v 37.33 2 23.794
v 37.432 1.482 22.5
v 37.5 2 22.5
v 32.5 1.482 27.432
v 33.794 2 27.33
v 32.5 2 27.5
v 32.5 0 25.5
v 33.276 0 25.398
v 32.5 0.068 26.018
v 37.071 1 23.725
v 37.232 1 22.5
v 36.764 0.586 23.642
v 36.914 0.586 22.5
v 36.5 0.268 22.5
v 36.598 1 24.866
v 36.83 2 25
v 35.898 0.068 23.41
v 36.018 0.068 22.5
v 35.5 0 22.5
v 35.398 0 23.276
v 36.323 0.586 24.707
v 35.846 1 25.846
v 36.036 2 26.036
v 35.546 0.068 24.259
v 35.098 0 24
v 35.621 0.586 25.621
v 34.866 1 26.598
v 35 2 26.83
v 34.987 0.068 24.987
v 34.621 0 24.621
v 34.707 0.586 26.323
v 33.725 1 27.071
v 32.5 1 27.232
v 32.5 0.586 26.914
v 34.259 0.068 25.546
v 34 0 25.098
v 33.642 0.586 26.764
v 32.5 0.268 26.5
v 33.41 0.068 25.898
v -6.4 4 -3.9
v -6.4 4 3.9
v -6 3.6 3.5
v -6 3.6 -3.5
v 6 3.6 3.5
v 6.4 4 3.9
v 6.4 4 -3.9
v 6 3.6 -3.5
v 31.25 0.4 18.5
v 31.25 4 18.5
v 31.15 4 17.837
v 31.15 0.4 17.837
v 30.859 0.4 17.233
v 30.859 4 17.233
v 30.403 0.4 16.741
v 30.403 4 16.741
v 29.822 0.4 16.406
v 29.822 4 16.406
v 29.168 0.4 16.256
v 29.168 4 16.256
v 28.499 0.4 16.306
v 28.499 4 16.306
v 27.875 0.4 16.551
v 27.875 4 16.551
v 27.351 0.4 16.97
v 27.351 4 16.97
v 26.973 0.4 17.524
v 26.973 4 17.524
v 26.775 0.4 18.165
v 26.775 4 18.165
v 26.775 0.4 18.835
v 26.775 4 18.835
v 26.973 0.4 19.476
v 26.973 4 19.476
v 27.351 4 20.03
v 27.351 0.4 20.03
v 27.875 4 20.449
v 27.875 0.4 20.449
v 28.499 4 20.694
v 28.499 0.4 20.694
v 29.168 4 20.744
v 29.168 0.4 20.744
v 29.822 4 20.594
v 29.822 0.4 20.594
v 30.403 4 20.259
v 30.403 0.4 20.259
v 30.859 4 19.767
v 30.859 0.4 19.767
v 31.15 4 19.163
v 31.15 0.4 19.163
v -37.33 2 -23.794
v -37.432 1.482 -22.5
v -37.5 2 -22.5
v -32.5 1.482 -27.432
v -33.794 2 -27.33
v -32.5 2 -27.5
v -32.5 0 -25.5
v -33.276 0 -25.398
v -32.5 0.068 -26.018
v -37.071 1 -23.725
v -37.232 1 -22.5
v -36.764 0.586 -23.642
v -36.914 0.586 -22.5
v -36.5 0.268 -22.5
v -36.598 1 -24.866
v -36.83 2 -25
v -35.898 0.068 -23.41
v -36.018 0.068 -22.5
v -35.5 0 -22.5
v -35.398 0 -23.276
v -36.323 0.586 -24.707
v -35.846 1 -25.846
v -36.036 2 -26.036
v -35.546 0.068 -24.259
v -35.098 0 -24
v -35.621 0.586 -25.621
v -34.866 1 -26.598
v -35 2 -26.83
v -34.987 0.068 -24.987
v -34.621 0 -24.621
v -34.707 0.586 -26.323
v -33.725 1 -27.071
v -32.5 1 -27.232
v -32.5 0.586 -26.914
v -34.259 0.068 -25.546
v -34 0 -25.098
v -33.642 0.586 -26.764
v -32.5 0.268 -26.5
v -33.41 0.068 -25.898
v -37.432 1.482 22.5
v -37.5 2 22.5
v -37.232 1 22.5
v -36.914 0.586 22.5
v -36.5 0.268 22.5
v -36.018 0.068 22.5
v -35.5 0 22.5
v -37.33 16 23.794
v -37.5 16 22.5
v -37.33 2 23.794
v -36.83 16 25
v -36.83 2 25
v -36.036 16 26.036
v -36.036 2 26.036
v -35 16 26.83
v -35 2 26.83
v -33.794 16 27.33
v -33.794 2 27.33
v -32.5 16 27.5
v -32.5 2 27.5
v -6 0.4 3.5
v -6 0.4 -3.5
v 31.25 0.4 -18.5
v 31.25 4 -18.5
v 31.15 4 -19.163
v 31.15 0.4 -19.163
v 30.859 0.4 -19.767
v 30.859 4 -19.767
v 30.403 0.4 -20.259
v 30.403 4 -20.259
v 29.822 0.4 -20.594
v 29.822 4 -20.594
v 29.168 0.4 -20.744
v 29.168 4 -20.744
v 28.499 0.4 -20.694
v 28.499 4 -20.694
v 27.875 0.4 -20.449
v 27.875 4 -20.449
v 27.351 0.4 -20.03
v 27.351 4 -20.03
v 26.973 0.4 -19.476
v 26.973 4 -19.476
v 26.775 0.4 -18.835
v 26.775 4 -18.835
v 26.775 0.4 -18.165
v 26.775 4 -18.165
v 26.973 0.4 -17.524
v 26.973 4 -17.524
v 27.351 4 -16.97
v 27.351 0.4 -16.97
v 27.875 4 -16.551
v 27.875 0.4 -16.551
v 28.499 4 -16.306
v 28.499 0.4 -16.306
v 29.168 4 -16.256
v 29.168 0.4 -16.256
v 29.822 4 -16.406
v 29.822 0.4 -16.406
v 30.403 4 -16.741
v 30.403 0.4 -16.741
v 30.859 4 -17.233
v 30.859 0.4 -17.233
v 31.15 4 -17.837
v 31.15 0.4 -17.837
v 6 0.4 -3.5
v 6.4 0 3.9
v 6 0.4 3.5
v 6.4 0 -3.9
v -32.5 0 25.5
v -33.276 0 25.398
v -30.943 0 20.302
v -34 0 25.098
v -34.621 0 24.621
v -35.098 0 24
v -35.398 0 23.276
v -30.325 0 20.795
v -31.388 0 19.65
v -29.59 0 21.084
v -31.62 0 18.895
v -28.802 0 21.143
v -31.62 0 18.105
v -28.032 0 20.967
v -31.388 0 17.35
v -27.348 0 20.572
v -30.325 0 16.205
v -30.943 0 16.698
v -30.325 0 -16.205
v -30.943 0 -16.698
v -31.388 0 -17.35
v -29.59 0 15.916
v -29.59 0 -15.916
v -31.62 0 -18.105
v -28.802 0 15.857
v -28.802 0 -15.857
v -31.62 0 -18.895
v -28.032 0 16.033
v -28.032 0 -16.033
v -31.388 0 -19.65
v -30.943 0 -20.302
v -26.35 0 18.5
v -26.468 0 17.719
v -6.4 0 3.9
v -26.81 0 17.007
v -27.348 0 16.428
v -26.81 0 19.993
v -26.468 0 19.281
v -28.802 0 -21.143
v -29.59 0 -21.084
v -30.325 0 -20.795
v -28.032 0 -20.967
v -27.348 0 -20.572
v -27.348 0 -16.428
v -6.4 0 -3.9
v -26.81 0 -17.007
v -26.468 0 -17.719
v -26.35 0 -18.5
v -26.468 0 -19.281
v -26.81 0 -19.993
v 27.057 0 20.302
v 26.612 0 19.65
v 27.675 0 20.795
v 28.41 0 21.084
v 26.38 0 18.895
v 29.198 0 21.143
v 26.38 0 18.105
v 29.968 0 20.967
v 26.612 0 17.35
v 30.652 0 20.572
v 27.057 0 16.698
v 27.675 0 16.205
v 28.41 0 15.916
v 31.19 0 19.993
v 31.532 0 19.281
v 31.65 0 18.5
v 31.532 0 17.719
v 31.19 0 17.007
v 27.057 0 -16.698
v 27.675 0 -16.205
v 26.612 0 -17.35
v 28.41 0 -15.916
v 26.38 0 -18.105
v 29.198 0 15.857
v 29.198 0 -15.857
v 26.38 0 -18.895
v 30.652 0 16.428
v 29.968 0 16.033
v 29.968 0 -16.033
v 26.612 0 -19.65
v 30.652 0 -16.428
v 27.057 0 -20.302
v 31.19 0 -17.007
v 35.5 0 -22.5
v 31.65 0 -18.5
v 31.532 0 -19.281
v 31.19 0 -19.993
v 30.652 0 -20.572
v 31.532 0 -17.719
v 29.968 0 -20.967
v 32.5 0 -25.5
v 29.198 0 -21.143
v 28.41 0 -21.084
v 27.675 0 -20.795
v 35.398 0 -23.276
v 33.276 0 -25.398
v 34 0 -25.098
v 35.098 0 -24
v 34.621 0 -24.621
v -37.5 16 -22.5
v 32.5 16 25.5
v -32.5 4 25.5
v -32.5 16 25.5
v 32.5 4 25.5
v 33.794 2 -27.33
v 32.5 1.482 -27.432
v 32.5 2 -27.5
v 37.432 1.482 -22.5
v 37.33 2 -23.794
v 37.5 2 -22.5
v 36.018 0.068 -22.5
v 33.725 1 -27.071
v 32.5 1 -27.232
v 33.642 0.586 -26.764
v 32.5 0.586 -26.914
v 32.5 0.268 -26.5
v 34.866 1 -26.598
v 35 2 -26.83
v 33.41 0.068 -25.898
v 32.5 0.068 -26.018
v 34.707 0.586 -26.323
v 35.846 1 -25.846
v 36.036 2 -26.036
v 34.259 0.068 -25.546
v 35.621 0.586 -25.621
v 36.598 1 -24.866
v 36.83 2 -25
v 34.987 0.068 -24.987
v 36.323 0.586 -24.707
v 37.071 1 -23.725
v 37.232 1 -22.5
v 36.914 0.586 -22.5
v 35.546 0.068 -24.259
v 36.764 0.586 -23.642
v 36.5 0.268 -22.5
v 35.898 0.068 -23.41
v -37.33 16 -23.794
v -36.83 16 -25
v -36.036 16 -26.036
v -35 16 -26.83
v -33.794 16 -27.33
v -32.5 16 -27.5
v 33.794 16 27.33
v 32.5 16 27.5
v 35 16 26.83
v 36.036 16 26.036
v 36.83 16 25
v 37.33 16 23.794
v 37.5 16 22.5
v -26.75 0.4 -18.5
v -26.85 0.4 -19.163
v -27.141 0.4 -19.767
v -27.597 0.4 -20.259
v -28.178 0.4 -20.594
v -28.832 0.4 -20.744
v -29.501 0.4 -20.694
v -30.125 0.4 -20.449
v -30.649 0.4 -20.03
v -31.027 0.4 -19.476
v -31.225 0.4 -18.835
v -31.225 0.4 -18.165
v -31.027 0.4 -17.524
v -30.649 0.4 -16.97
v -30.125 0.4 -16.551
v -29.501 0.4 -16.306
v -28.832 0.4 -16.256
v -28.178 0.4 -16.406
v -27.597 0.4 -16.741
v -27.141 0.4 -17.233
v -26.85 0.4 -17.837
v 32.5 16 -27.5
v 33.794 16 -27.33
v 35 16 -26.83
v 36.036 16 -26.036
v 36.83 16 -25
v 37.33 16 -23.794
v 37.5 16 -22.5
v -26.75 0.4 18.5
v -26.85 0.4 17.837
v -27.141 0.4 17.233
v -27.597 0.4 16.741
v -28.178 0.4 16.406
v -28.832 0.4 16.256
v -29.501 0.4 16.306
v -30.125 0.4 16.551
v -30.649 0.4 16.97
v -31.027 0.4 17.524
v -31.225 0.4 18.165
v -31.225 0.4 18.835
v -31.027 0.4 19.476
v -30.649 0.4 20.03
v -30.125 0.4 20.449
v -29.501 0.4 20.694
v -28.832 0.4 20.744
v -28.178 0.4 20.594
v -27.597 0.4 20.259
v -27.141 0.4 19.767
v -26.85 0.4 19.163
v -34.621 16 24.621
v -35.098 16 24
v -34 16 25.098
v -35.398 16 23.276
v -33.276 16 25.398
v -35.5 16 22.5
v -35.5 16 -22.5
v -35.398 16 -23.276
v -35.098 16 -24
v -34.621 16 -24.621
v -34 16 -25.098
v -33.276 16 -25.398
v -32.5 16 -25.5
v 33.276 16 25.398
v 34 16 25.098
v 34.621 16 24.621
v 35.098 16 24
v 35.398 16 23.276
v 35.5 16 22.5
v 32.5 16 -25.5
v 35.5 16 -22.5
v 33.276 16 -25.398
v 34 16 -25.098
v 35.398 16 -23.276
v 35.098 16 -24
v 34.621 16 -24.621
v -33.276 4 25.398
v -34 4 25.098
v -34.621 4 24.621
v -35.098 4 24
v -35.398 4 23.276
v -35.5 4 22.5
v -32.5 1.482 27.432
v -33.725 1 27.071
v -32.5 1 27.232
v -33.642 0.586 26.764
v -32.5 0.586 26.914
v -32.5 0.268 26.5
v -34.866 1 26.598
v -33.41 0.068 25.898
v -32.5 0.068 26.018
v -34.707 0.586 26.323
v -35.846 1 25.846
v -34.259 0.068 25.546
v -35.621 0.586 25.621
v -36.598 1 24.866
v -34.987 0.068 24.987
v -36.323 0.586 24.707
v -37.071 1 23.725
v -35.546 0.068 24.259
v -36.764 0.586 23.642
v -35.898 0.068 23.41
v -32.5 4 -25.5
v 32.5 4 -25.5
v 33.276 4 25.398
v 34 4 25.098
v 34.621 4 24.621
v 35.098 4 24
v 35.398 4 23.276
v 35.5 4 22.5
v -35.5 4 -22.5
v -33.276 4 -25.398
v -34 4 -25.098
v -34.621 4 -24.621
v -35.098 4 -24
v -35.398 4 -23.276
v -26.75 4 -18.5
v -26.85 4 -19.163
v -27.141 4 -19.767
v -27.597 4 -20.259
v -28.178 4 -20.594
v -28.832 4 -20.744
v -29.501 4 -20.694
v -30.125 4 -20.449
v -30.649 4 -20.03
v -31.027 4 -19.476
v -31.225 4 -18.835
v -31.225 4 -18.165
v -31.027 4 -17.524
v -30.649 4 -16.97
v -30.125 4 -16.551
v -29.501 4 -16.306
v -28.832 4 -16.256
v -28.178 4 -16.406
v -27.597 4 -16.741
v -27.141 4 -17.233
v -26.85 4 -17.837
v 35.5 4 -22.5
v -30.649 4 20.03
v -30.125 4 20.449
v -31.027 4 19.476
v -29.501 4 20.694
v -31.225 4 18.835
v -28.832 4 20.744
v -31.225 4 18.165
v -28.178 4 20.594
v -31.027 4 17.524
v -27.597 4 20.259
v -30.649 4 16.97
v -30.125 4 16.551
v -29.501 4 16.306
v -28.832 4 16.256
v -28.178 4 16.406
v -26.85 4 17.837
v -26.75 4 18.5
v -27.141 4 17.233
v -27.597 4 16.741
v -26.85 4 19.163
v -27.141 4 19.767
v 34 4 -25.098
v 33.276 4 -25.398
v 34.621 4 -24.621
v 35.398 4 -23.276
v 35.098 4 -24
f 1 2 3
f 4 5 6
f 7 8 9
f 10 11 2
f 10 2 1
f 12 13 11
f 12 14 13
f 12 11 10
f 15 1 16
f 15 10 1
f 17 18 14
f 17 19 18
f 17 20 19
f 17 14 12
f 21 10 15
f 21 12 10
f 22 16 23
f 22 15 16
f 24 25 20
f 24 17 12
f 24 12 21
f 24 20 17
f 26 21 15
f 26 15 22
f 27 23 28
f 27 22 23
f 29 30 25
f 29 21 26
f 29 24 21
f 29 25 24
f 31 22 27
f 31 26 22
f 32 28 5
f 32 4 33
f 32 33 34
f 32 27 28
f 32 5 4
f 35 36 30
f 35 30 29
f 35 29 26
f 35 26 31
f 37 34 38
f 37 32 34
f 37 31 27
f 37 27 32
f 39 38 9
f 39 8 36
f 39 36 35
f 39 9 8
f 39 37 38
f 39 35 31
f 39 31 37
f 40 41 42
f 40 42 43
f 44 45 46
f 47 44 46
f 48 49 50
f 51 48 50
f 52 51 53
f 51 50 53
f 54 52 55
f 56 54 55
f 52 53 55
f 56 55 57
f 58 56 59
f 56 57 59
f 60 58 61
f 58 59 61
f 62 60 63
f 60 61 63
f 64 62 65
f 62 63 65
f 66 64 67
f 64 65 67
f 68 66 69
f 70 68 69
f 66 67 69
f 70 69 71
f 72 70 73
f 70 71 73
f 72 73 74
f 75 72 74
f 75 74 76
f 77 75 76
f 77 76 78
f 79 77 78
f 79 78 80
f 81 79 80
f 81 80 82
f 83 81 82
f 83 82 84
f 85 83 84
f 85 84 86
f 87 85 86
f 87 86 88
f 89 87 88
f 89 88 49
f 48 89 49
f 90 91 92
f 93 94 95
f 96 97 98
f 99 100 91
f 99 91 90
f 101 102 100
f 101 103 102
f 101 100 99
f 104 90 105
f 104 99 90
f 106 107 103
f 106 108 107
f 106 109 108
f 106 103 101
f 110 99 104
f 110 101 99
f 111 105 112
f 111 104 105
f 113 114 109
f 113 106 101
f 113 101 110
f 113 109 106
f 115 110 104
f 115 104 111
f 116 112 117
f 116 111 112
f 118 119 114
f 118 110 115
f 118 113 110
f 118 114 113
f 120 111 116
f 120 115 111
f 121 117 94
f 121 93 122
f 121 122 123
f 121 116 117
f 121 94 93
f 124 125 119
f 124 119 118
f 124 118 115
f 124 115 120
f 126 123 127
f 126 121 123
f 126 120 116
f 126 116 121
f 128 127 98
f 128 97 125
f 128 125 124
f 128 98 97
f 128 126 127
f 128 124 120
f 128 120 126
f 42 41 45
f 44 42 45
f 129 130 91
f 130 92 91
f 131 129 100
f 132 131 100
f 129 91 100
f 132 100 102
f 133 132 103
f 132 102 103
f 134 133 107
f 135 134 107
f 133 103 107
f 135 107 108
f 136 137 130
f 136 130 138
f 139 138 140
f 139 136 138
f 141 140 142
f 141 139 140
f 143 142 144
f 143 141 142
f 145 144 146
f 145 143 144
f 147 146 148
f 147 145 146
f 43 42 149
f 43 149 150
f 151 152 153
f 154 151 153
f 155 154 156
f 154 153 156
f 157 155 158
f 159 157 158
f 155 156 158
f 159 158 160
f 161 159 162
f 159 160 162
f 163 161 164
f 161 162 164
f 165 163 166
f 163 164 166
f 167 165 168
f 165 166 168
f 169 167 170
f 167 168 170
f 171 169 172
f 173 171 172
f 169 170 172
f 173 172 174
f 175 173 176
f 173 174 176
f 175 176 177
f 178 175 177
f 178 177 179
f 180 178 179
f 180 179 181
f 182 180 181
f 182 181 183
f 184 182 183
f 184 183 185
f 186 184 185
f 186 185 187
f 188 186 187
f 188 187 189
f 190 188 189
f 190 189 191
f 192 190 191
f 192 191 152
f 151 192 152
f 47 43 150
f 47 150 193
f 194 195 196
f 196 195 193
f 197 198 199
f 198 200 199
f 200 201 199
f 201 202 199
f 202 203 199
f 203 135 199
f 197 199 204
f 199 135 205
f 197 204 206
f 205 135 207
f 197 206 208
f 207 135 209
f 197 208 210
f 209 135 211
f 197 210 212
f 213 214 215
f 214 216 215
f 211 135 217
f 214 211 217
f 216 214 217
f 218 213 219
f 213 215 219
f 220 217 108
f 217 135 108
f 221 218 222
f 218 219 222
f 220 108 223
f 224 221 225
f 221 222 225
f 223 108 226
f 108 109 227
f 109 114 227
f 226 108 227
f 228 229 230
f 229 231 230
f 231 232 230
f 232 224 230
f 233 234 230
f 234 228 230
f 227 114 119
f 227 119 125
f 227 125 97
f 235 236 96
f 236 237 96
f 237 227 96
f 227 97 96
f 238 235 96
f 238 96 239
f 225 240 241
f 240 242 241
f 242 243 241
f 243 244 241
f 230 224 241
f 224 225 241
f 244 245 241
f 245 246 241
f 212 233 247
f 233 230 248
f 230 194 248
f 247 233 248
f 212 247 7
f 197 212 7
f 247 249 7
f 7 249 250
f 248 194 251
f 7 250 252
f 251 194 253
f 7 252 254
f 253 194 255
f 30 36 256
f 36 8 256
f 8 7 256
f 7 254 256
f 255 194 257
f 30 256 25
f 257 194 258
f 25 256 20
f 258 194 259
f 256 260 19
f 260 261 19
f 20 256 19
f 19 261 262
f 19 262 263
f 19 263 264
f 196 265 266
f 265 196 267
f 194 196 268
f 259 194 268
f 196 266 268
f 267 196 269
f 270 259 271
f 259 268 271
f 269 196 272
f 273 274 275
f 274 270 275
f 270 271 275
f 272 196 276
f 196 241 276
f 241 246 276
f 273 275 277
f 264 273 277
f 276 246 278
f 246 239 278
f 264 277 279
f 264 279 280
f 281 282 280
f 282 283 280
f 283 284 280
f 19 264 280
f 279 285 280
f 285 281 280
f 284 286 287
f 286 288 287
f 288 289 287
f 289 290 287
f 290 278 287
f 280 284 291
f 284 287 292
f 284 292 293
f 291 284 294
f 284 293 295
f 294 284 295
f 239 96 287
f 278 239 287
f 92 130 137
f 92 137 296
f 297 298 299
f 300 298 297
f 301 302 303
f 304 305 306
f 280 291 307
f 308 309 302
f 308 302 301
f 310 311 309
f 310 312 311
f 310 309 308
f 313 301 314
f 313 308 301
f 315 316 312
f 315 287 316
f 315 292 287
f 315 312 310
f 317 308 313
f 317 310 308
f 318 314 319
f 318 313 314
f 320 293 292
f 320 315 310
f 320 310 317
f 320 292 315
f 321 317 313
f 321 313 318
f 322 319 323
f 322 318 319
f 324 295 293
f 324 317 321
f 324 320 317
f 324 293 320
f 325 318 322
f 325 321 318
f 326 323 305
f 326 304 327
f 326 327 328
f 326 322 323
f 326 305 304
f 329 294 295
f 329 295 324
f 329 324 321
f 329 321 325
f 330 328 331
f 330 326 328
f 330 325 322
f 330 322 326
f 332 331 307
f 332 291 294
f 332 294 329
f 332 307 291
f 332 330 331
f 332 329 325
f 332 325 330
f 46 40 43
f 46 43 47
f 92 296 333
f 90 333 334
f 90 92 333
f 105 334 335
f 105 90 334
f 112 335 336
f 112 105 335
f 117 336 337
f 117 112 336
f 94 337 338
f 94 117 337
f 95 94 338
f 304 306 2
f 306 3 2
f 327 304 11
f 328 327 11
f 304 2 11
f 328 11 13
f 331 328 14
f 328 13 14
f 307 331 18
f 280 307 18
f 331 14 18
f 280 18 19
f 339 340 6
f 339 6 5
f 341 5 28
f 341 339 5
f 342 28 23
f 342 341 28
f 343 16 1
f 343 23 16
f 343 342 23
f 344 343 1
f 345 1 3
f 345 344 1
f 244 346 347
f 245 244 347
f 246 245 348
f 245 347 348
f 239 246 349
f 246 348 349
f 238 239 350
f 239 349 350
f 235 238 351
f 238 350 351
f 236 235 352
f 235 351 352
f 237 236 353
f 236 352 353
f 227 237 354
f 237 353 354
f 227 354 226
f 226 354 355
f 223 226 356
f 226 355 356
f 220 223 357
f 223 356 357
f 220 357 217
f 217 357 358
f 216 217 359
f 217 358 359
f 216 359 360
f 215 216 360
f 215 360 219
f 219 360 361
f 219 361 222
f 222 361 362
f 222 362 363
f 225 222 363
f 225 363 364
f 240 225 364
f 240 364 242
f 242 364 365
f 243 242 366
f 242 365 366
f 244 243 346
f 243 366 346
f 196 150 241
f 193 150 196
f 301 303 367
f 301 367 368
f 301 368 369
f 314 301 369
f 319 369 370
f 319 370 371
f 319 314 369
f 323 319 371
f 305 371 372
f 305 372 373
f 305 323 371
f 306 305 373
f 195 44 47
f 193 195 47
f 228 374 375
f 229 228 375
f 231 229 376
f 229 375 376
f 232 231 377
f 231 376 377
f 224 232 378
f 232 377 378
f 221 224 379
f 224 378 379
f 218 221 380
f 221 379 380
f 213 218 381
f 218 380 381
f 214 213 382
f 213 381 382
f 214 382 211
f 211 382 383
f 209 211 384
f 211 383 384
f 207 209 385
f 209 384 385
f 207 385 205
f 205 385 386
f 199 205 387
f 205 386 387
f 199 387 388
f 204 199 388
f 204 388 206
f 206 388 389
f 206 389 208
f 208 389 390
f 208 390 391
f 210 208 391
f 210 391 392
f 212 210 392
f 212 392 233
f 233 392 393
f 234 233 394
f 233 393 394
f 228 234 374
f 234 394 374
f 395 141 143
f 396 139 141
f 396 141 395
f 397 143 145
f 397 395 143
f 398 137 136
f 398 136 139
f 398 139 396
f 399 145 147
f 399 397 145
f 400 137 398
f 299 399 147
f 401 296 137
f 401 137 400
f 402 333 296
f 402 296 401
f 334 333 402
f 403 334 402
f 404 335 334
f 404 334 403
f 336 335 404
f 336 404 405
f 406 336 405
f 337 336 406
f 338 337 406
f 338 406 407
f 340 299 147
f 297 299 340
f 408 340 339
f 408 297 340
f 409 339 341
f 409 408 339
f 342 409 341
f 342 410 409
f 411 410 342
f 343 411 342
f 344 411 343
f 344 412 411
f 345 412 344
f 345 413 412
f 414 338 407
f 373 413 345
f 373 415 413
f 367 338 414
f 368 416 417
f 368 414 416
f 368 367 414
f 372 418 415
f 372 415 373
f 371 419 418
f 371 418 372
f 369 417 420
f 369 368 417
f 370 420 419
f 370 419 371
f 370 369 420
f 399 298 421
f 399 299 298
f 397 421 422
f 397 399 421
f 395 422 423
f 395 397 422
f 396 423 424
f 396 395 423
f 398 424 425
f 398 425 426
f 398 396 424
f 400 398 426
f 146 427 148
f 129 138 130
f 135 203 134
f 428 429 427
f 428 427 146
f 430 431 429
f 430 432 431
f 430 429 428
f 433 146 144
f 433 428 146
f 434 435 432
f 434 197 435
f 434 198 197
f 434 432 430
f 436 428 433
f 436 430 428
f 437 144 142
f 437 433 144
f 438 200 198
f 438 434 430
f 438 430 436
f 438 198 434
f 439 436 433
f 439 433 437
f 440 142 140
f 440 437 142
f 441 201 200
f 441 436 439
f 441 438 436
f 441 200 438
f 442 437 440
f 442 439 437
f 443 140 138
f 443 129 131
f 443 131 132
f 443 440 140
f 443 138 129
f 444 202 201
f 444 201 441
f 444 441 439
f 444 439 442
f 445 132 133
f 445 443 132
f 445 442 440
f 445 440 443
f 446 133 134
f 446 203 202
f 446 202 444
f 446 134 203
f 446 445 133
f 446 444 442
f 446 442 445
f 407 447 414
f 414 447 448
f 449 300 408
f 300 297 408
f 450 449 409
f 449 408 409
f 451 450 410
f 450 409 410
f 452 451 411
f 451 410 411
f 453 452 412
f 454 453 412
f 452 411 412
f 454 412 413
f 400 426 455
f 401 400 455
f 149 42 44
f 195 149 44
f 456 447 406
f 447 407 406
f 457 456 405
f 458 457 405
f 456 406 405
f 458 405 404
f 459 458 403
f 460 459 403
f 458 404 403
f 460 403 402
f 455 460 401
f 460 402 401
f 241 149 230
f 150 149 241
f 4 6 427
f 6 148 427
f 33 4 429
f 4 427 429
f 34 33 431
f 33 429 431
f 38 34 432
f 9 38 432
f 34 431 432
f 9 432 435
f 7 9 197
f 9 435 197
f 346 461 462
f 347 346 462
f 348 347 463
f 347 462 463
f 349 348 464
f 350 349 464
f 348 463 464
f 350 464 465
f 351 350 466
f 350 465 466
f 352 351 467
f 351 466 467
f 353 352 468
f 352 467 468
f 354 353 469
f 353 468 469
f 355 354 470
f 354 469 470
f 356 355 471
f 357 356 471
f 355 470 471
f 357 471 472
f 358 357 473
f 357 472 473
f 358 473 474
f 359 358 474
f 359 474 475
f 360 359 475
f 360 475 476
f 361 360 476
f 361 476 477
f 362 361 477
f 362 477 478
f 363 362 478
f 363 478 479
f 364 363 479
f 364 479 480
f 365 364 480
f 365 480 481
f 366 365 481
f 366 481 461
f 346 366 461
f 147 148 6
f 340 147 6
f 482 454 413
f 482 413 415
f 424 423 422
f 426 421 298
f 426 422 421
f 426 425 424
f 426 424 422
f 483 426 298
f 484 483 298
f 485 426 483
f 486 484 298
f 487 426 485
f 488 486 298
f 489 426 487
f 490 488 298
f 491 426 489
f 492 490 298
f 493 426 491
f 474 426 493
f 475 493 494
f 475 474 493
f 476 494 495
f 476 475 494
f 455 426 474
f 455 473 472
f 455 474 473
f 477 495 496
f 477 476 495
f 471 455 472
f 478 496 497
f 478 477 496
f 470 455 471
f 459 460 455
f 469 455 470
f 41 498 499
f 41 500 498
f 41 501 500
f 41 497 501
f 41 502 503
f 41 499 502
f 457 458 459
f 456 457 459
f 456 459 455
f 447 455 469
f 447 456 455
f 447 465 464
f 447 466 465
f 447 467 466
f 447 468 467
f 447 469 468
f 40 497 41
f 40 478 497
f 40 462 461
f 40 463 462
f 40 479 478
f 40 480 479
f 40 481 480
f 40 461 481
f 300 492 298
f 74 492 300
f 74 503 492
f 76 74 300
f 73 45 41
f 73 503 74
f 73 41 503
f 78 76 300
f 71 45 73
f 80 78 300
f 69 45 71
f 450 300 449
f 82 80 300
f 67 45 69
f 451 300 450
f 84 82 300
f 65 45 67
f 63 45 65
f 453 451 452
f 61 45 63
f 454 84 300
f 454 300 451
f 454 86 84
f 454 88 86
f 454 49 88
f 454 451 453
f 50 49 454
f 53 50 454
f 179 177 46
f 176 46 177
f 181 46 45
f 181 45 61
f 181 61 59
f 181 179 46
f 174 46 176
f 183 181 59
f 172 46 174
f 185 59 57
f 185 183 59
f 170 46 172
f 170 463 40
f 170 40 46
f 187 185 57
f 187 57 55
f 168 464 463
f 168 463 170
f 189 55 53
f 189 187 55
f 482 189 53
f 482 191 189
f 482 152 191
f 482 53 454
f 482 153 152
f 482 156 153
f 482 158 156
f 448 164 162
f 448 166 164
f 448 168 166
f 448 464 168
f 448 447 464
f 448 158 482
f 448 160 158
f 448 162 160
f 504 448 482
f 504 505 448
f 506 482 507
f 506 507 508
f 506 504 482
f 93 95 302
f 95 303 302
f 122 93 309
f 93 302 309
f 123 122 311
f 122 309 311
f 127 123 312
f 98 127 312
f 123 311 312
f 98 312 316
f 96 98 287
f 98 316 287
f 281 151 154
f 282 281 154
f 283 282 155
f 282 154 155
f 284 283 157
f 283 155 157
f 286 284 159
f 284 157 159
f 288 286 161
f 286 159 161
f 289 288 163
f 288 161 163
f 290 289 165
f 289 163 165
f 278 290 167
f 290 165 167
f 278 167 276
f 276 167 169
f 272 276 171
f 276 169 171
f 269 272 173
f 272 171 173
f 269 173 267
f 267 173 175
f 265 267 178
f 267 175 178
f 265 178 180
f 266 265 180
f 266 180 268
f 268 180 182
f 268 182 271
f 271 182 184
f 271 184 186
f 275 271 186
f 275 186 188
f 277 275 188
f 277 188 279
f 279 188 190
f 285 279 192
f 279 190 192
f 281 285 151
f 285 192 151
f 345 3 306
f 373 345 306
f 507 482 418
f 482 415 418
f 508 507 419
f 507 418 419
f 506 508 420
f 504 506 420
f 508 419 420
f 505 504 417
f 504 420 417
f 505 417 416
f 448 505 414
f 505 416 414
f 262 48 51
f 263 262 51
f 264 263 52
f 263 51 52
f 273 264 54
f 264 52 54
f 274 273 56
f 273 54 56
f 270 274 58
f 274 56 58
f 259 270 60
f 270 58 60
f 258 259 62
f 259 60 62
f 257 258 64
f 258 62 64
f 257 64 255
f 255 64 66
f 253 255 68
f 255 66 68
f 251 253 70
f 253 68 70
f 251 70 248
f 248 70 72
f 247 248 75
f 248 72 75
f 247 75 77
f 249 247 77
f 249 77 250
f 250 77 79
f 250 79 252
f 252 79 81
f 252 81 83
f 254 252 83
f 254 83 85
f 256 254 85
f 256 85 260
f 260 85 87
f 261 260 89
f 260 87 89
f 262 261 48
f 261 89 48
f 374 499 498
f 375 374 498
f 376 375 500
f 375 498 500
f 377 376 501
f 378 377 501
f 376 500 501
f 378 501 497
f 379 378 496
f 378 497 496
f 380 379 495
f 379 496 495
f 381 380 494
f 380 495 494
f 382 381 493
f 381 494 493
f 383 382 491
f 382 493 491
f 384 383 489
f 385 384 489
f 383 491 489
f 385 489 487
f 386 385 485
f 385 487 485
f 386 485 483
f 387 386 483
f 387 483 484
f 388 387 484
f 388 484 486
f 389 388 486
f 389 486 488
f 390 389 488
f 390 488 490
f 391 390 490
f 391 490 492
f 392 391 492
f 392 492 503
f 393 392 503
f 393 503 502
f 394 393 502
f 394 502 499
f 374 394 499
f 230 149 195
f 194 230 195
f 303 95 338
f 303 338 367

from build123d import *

# Parameters (mm, degrees)
SKETCH1_W           = 75
SKETCH1_H           = 55
BOSS_EXTRUDE1_DEPTH = 4
SKETCH2_W           = 75
SKETCH2_H           = 55
SKETCH2_W_2         = 71
SKETCH2_H_2         = 51
BOSS_EXTRUDE2_DEPTH = 12
SKETCH3_R           = 2.25
SKETCH3_W           = 12
SKETCH3_H           = 7
CUT_EXTRUDE1_DEPTH  = 5
FILLET1_R           = 5
FILLET2_R           = 3
FILLET3_R           = 2
CHAMFER1_SIZE       = 0.4


with BuildPart() as part:
    # Sketch1 → Boss-Extrude1 (new body)
    with BuildSketch(Plane(origin=(0, 0, 0), x_dir=(1, 0, 0), z_dir=(0, 1, 0))):
        Rectangle(SKETCH1_W, SKETCH1_H)
    extrude(amount=BOSS_EXTRUDE1_DEPTH)

    # Sketch2 → Boss-Extrude2 (add)
    with BuildSketch(Plane(origin=(0, 4, 0), x_dir=(1, 0, 0), z_dir=(0, 1, 0))):
        Rectangle(SKETCH2_W, SKETCH2_H)
        Rectangle(SKETCH2_W_2, SKETCH2_H_2, mode=Mode.SUBTRACT)
    extrude(amount=BOSS_EXTRUDE2_DEPTH)

    # Sketch3 → Cut-Extrude1 (cut, through all)
    with BuildSketch(Plane(origin=(0, 4, 0), x_dir=(1, 0, 0), z_dir=(0, 1, 0))):
        with Locations((-29, 18.5)):
            Circle(SKETCH3_R)
        with Locations((29, 18.5)):
            Circle(SKETCH3_R)
        with Locations((29, -18.5)):
            Circle(SKETCH3_R)
        with Locations((-29, -18.5)):
            Circle(SKETCH3_R)
        Rectangle(SKETCH3_W, SKETCH3_H)
    extrude(amount=-CUT_EXTRUDE1_DEPTH, mode=Mode.SUBTRACT)

    # Fillet1
    fillet1_edges = [part.edges().sort_by_distance(p)[0] for p in [
        (37.5, 8, 27.5),
        (-37.5, 8, 27.5),
        (-37.5, 8, -27.5),
        (37.5, 8, -27.5),
    ]]
    fillet(fillet1_edges, radius=FILLET1_R)

    # Fillet2
    fillet2_edges = [part.edges().sort_by_distance(p)[0] for p in [
        (35.5, 10, -25.5),
        (-35.5, 10, -25.5),
        (-35.5, 10, 25.5),
        (35.5, 10, 25.5),
    ]]
    fillet(fillet2_edges, radius=FILLET2_R)

    # Fillet3
    fillet3_edges = [part.edges().sort_by_distance(p)[0] for p in [
        (-37.5, 0, 0),
        (37.5, 0, 0),
        (0, 0, 27.5),
        (0, 0, -27.5),
        (-36.035533906, 0, 26.035533906),
        (36.035533906, 0, 26.035533906),
        (36.035533906, 0, -26.035533906),
        (-36.035533906, 0, -26.035533906),
    ]]
    fillet(fillet3_edges, radius=FILLET3_R)

    # Chamfer1
    chamfer1_edges = [part.edges().sort_by_distance(p)[0] for p in [
        (6, 0, 0),
        (0, 0, 3.5),
        (-6, 0, 0),
        (0, 0, -3.5),
        (6, 4, 0),
        (0, 4, -3.5),
        (-6, 4, 0),
        (0, 4, 3.5),
        (-31.25, 0, 18.5),
        (26.75, 0, 18.5),
        (26.75, 0, -18.5),
        (-31.25, 0, -18.5),
    ]]
    chamfer(chamfer1_edges, length=CHAMFER1_SIZE)


solid = part.part
